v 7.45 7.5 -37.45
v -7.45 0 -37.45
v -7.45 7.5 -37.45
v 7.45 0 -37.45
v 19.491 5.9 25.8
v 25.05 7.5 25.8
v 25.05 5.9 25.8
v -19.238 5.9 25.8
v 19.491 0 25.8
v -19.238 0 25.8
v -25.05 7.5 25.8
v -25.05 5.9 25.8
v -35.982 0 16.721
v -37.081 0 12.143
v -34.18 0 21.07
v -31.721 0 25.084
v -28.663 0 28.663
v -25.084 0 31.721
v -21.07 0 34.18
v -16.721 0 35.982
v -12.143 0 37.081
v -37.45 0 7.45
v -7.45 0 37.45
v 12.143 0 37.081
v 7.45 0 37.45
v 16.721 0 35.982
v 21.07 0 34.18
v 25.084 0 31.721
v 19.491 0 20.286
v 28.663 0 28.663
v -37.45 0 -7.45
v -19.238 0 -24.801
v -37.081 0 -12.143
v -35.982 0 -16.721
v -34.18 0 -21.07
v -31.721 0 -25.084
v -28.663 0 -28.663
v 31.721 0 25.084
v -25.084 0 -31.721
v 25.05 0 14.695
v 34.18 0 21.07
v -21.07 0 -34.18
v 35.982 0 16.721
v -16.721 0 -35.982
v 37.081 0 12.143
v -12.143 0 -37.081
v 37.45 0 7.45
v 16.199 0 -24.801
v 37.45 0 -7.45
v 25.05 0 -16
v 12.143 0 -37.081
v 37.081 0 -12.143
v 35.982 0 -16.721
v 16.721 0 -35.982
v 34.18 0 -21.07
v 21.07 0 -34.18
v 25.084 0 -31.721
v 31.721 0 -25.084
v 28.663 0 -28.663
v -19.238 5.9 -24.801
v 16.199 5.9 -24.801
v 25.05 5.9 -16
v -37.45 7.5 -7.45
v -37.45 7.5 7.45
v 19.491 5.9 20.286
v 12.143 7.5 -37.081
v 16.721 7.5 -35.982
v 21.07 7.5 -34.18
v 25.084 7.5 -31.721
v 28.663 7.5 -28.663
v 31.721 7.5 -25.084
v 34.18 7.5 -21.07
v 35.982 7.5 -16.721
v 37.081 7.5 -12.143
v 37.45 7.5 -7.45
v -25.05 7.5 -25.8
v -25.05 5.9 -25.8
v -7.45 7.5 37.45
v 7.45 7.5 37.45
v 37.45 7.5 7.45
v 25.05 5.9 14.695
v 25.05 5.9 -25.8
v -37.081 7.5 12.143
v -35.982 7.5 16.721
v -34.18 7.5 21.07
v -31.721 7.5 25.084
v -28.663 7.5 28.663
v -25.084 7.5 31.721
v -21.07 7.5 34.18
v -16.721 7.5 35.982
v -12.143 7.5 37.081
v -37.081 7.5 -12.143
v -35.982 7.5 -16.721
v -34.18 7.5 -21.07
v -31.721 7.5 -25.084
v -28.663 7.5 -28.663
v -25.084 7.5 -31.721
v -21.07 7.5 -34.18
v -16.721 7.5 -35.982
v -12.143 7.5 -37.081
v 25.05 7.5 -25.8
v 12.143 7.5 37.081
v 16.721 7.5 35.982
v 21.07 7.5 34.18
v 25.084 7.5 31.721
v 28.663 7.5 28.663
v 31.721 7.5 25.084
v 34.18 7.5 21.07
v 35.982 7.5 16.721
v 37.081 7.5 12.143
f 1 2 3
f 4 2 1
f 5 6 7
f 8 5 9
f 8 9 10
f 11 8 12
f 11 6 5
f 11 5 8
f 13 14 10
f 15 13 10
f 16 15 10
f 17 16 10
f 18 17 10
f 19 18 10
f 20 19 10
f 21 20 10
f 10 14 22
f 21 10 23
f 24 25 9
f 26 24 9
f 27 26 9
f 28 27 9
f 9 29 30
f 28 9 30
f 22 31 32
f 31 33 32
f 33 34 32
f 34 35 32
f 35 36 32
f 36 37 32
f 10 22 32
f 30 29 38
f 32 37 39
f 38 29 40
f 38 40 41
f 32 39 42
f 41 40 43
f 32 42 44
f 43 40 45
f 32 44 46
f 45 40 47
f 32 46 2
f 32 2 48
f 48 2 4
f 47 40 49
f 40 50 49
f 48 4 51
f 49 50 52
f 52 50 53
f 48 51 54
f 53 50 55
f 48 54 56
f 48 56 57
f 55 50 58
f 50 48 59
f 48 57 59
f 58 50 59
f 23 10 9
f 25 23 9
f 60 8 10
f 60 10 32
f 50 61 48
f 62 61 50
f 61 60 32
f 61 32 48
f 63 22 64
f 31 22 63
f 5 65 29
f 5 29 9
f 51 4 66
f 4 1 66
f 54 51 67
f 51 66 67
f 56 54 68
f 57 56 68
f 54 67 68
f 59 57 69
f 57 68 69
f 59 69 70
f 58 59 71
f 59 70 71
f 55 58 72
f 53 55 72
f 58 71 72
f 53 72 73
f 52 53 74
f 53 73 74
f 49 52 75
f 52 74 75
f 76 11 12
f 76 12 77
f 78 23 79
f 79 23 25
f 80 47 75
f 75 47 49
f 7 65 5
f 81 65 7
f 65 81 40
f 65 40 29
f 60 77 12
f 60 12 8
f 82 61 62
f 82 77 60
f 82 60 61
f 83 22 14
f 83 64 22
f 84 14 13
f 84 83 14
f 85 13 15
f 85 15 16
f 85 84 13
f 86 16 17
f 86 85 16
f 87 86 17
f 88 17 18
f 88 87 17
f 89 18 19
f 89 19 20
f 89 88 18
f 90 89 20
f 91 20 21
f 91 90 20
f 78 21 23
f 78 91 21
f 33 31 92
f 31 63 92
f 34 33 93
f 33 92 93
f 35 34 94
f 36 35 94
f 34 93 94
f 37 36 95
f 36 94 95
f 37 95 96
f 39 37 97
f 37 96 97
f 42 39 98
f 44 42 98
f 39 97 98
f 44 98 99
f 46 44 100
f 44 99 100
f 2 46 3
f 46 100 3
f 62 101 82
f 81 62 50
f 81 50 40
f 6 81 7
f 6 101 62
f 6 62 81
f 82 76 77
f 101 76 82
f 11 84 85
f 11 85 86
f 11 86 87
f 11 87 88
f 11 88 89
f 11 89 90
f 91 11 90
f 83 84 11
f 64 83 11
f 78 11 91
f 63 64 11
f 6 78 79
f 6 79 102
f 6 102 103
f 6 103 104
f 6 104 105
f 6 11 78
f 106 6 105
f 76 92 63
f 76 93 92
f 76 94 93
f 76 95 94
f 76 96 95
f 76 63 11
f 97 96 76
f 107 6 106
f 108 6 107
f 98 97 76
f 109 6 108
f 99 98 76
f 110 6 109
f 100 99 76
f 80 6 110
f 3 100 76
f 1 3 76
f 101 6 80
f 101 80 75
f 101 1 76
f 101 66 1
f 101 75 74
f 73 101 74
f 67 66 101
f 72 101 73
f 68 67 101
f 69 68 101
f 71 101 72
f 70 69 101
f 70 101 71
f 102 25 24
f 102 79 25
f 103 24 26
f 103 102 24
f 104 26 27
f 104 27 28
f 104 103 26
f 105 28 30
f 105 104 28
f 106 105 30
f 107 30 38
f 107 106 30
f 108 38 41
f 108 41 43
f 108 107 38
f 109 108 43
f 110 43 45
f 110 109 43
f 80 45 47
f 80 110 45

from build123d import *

# Parameters (mm, degrees)
SKETCH2_W          = 74.9
SKETCH2_H          = 74.9
BASE_DEPTH         = 7.5
SKETCH3_W          = 50.1
SKETCH3_H          = 51.6
SLOT_DEPTH         = 1.6
CUT_EXTRUDE2_DEPTH = 5.9
FILLET1_R          = 30


with BuildPart() as part:
    # Sketch2 → Base (new body)
    with BuildSketch(Plane(origin=(0, 0, 0), x_dir=(1, 0, 0), z_dir=(0, 1, 0))):
        Rectangle(SKETCH2_W, SKETCH2_H)
    extrude(amount=BASE_DEPTH)

    # Sketch3 → Slot (cut)
    with BuildSketch(Plane(origin=(0, 7.5, 0), x_dir=(1, 0, 0), z_dir=(0, 1, 0))):
        Rectangle(SKETCH3_W, SKETCH3_H)
    extrude(amount=-SLOT_DEPTH, mode=Mode.SUBTRACT)

    # Sketch4 → Cut-Extrude2 (cut)
    with BuildSketch(Plane(origin=(0, 5.9, 0), x_dir=(1, 0, 0), z_dir=(0, 1, 0))):
        Polygon((-19.238008182, -25.8), (-19.238008182, 24.800726292), (16.199230682, 24.800726292), (25.05, 15.999956974), (25.05, -14.695394427), (19.490907044, -20.286070377), (19.490907044, -25.8), align=None)
    extrude(amount=-CUT_EXTRUDE2_DEPTH, mode=Mode.SUBTRACT)

    # Fillet1
    fillet1_edges = [part.edges().sort_by_distance(p)[0] for p in [
        (37.45, 3.75, 37.45),
        (-37.45, 3.75, 37.45),
        (-37.45, 3.75, -37.45),
        (37.45, 3.75, -37.45),
    ]]
    fillet(fillet1_edges, radius=FILLET1_R)


solid = part.part
